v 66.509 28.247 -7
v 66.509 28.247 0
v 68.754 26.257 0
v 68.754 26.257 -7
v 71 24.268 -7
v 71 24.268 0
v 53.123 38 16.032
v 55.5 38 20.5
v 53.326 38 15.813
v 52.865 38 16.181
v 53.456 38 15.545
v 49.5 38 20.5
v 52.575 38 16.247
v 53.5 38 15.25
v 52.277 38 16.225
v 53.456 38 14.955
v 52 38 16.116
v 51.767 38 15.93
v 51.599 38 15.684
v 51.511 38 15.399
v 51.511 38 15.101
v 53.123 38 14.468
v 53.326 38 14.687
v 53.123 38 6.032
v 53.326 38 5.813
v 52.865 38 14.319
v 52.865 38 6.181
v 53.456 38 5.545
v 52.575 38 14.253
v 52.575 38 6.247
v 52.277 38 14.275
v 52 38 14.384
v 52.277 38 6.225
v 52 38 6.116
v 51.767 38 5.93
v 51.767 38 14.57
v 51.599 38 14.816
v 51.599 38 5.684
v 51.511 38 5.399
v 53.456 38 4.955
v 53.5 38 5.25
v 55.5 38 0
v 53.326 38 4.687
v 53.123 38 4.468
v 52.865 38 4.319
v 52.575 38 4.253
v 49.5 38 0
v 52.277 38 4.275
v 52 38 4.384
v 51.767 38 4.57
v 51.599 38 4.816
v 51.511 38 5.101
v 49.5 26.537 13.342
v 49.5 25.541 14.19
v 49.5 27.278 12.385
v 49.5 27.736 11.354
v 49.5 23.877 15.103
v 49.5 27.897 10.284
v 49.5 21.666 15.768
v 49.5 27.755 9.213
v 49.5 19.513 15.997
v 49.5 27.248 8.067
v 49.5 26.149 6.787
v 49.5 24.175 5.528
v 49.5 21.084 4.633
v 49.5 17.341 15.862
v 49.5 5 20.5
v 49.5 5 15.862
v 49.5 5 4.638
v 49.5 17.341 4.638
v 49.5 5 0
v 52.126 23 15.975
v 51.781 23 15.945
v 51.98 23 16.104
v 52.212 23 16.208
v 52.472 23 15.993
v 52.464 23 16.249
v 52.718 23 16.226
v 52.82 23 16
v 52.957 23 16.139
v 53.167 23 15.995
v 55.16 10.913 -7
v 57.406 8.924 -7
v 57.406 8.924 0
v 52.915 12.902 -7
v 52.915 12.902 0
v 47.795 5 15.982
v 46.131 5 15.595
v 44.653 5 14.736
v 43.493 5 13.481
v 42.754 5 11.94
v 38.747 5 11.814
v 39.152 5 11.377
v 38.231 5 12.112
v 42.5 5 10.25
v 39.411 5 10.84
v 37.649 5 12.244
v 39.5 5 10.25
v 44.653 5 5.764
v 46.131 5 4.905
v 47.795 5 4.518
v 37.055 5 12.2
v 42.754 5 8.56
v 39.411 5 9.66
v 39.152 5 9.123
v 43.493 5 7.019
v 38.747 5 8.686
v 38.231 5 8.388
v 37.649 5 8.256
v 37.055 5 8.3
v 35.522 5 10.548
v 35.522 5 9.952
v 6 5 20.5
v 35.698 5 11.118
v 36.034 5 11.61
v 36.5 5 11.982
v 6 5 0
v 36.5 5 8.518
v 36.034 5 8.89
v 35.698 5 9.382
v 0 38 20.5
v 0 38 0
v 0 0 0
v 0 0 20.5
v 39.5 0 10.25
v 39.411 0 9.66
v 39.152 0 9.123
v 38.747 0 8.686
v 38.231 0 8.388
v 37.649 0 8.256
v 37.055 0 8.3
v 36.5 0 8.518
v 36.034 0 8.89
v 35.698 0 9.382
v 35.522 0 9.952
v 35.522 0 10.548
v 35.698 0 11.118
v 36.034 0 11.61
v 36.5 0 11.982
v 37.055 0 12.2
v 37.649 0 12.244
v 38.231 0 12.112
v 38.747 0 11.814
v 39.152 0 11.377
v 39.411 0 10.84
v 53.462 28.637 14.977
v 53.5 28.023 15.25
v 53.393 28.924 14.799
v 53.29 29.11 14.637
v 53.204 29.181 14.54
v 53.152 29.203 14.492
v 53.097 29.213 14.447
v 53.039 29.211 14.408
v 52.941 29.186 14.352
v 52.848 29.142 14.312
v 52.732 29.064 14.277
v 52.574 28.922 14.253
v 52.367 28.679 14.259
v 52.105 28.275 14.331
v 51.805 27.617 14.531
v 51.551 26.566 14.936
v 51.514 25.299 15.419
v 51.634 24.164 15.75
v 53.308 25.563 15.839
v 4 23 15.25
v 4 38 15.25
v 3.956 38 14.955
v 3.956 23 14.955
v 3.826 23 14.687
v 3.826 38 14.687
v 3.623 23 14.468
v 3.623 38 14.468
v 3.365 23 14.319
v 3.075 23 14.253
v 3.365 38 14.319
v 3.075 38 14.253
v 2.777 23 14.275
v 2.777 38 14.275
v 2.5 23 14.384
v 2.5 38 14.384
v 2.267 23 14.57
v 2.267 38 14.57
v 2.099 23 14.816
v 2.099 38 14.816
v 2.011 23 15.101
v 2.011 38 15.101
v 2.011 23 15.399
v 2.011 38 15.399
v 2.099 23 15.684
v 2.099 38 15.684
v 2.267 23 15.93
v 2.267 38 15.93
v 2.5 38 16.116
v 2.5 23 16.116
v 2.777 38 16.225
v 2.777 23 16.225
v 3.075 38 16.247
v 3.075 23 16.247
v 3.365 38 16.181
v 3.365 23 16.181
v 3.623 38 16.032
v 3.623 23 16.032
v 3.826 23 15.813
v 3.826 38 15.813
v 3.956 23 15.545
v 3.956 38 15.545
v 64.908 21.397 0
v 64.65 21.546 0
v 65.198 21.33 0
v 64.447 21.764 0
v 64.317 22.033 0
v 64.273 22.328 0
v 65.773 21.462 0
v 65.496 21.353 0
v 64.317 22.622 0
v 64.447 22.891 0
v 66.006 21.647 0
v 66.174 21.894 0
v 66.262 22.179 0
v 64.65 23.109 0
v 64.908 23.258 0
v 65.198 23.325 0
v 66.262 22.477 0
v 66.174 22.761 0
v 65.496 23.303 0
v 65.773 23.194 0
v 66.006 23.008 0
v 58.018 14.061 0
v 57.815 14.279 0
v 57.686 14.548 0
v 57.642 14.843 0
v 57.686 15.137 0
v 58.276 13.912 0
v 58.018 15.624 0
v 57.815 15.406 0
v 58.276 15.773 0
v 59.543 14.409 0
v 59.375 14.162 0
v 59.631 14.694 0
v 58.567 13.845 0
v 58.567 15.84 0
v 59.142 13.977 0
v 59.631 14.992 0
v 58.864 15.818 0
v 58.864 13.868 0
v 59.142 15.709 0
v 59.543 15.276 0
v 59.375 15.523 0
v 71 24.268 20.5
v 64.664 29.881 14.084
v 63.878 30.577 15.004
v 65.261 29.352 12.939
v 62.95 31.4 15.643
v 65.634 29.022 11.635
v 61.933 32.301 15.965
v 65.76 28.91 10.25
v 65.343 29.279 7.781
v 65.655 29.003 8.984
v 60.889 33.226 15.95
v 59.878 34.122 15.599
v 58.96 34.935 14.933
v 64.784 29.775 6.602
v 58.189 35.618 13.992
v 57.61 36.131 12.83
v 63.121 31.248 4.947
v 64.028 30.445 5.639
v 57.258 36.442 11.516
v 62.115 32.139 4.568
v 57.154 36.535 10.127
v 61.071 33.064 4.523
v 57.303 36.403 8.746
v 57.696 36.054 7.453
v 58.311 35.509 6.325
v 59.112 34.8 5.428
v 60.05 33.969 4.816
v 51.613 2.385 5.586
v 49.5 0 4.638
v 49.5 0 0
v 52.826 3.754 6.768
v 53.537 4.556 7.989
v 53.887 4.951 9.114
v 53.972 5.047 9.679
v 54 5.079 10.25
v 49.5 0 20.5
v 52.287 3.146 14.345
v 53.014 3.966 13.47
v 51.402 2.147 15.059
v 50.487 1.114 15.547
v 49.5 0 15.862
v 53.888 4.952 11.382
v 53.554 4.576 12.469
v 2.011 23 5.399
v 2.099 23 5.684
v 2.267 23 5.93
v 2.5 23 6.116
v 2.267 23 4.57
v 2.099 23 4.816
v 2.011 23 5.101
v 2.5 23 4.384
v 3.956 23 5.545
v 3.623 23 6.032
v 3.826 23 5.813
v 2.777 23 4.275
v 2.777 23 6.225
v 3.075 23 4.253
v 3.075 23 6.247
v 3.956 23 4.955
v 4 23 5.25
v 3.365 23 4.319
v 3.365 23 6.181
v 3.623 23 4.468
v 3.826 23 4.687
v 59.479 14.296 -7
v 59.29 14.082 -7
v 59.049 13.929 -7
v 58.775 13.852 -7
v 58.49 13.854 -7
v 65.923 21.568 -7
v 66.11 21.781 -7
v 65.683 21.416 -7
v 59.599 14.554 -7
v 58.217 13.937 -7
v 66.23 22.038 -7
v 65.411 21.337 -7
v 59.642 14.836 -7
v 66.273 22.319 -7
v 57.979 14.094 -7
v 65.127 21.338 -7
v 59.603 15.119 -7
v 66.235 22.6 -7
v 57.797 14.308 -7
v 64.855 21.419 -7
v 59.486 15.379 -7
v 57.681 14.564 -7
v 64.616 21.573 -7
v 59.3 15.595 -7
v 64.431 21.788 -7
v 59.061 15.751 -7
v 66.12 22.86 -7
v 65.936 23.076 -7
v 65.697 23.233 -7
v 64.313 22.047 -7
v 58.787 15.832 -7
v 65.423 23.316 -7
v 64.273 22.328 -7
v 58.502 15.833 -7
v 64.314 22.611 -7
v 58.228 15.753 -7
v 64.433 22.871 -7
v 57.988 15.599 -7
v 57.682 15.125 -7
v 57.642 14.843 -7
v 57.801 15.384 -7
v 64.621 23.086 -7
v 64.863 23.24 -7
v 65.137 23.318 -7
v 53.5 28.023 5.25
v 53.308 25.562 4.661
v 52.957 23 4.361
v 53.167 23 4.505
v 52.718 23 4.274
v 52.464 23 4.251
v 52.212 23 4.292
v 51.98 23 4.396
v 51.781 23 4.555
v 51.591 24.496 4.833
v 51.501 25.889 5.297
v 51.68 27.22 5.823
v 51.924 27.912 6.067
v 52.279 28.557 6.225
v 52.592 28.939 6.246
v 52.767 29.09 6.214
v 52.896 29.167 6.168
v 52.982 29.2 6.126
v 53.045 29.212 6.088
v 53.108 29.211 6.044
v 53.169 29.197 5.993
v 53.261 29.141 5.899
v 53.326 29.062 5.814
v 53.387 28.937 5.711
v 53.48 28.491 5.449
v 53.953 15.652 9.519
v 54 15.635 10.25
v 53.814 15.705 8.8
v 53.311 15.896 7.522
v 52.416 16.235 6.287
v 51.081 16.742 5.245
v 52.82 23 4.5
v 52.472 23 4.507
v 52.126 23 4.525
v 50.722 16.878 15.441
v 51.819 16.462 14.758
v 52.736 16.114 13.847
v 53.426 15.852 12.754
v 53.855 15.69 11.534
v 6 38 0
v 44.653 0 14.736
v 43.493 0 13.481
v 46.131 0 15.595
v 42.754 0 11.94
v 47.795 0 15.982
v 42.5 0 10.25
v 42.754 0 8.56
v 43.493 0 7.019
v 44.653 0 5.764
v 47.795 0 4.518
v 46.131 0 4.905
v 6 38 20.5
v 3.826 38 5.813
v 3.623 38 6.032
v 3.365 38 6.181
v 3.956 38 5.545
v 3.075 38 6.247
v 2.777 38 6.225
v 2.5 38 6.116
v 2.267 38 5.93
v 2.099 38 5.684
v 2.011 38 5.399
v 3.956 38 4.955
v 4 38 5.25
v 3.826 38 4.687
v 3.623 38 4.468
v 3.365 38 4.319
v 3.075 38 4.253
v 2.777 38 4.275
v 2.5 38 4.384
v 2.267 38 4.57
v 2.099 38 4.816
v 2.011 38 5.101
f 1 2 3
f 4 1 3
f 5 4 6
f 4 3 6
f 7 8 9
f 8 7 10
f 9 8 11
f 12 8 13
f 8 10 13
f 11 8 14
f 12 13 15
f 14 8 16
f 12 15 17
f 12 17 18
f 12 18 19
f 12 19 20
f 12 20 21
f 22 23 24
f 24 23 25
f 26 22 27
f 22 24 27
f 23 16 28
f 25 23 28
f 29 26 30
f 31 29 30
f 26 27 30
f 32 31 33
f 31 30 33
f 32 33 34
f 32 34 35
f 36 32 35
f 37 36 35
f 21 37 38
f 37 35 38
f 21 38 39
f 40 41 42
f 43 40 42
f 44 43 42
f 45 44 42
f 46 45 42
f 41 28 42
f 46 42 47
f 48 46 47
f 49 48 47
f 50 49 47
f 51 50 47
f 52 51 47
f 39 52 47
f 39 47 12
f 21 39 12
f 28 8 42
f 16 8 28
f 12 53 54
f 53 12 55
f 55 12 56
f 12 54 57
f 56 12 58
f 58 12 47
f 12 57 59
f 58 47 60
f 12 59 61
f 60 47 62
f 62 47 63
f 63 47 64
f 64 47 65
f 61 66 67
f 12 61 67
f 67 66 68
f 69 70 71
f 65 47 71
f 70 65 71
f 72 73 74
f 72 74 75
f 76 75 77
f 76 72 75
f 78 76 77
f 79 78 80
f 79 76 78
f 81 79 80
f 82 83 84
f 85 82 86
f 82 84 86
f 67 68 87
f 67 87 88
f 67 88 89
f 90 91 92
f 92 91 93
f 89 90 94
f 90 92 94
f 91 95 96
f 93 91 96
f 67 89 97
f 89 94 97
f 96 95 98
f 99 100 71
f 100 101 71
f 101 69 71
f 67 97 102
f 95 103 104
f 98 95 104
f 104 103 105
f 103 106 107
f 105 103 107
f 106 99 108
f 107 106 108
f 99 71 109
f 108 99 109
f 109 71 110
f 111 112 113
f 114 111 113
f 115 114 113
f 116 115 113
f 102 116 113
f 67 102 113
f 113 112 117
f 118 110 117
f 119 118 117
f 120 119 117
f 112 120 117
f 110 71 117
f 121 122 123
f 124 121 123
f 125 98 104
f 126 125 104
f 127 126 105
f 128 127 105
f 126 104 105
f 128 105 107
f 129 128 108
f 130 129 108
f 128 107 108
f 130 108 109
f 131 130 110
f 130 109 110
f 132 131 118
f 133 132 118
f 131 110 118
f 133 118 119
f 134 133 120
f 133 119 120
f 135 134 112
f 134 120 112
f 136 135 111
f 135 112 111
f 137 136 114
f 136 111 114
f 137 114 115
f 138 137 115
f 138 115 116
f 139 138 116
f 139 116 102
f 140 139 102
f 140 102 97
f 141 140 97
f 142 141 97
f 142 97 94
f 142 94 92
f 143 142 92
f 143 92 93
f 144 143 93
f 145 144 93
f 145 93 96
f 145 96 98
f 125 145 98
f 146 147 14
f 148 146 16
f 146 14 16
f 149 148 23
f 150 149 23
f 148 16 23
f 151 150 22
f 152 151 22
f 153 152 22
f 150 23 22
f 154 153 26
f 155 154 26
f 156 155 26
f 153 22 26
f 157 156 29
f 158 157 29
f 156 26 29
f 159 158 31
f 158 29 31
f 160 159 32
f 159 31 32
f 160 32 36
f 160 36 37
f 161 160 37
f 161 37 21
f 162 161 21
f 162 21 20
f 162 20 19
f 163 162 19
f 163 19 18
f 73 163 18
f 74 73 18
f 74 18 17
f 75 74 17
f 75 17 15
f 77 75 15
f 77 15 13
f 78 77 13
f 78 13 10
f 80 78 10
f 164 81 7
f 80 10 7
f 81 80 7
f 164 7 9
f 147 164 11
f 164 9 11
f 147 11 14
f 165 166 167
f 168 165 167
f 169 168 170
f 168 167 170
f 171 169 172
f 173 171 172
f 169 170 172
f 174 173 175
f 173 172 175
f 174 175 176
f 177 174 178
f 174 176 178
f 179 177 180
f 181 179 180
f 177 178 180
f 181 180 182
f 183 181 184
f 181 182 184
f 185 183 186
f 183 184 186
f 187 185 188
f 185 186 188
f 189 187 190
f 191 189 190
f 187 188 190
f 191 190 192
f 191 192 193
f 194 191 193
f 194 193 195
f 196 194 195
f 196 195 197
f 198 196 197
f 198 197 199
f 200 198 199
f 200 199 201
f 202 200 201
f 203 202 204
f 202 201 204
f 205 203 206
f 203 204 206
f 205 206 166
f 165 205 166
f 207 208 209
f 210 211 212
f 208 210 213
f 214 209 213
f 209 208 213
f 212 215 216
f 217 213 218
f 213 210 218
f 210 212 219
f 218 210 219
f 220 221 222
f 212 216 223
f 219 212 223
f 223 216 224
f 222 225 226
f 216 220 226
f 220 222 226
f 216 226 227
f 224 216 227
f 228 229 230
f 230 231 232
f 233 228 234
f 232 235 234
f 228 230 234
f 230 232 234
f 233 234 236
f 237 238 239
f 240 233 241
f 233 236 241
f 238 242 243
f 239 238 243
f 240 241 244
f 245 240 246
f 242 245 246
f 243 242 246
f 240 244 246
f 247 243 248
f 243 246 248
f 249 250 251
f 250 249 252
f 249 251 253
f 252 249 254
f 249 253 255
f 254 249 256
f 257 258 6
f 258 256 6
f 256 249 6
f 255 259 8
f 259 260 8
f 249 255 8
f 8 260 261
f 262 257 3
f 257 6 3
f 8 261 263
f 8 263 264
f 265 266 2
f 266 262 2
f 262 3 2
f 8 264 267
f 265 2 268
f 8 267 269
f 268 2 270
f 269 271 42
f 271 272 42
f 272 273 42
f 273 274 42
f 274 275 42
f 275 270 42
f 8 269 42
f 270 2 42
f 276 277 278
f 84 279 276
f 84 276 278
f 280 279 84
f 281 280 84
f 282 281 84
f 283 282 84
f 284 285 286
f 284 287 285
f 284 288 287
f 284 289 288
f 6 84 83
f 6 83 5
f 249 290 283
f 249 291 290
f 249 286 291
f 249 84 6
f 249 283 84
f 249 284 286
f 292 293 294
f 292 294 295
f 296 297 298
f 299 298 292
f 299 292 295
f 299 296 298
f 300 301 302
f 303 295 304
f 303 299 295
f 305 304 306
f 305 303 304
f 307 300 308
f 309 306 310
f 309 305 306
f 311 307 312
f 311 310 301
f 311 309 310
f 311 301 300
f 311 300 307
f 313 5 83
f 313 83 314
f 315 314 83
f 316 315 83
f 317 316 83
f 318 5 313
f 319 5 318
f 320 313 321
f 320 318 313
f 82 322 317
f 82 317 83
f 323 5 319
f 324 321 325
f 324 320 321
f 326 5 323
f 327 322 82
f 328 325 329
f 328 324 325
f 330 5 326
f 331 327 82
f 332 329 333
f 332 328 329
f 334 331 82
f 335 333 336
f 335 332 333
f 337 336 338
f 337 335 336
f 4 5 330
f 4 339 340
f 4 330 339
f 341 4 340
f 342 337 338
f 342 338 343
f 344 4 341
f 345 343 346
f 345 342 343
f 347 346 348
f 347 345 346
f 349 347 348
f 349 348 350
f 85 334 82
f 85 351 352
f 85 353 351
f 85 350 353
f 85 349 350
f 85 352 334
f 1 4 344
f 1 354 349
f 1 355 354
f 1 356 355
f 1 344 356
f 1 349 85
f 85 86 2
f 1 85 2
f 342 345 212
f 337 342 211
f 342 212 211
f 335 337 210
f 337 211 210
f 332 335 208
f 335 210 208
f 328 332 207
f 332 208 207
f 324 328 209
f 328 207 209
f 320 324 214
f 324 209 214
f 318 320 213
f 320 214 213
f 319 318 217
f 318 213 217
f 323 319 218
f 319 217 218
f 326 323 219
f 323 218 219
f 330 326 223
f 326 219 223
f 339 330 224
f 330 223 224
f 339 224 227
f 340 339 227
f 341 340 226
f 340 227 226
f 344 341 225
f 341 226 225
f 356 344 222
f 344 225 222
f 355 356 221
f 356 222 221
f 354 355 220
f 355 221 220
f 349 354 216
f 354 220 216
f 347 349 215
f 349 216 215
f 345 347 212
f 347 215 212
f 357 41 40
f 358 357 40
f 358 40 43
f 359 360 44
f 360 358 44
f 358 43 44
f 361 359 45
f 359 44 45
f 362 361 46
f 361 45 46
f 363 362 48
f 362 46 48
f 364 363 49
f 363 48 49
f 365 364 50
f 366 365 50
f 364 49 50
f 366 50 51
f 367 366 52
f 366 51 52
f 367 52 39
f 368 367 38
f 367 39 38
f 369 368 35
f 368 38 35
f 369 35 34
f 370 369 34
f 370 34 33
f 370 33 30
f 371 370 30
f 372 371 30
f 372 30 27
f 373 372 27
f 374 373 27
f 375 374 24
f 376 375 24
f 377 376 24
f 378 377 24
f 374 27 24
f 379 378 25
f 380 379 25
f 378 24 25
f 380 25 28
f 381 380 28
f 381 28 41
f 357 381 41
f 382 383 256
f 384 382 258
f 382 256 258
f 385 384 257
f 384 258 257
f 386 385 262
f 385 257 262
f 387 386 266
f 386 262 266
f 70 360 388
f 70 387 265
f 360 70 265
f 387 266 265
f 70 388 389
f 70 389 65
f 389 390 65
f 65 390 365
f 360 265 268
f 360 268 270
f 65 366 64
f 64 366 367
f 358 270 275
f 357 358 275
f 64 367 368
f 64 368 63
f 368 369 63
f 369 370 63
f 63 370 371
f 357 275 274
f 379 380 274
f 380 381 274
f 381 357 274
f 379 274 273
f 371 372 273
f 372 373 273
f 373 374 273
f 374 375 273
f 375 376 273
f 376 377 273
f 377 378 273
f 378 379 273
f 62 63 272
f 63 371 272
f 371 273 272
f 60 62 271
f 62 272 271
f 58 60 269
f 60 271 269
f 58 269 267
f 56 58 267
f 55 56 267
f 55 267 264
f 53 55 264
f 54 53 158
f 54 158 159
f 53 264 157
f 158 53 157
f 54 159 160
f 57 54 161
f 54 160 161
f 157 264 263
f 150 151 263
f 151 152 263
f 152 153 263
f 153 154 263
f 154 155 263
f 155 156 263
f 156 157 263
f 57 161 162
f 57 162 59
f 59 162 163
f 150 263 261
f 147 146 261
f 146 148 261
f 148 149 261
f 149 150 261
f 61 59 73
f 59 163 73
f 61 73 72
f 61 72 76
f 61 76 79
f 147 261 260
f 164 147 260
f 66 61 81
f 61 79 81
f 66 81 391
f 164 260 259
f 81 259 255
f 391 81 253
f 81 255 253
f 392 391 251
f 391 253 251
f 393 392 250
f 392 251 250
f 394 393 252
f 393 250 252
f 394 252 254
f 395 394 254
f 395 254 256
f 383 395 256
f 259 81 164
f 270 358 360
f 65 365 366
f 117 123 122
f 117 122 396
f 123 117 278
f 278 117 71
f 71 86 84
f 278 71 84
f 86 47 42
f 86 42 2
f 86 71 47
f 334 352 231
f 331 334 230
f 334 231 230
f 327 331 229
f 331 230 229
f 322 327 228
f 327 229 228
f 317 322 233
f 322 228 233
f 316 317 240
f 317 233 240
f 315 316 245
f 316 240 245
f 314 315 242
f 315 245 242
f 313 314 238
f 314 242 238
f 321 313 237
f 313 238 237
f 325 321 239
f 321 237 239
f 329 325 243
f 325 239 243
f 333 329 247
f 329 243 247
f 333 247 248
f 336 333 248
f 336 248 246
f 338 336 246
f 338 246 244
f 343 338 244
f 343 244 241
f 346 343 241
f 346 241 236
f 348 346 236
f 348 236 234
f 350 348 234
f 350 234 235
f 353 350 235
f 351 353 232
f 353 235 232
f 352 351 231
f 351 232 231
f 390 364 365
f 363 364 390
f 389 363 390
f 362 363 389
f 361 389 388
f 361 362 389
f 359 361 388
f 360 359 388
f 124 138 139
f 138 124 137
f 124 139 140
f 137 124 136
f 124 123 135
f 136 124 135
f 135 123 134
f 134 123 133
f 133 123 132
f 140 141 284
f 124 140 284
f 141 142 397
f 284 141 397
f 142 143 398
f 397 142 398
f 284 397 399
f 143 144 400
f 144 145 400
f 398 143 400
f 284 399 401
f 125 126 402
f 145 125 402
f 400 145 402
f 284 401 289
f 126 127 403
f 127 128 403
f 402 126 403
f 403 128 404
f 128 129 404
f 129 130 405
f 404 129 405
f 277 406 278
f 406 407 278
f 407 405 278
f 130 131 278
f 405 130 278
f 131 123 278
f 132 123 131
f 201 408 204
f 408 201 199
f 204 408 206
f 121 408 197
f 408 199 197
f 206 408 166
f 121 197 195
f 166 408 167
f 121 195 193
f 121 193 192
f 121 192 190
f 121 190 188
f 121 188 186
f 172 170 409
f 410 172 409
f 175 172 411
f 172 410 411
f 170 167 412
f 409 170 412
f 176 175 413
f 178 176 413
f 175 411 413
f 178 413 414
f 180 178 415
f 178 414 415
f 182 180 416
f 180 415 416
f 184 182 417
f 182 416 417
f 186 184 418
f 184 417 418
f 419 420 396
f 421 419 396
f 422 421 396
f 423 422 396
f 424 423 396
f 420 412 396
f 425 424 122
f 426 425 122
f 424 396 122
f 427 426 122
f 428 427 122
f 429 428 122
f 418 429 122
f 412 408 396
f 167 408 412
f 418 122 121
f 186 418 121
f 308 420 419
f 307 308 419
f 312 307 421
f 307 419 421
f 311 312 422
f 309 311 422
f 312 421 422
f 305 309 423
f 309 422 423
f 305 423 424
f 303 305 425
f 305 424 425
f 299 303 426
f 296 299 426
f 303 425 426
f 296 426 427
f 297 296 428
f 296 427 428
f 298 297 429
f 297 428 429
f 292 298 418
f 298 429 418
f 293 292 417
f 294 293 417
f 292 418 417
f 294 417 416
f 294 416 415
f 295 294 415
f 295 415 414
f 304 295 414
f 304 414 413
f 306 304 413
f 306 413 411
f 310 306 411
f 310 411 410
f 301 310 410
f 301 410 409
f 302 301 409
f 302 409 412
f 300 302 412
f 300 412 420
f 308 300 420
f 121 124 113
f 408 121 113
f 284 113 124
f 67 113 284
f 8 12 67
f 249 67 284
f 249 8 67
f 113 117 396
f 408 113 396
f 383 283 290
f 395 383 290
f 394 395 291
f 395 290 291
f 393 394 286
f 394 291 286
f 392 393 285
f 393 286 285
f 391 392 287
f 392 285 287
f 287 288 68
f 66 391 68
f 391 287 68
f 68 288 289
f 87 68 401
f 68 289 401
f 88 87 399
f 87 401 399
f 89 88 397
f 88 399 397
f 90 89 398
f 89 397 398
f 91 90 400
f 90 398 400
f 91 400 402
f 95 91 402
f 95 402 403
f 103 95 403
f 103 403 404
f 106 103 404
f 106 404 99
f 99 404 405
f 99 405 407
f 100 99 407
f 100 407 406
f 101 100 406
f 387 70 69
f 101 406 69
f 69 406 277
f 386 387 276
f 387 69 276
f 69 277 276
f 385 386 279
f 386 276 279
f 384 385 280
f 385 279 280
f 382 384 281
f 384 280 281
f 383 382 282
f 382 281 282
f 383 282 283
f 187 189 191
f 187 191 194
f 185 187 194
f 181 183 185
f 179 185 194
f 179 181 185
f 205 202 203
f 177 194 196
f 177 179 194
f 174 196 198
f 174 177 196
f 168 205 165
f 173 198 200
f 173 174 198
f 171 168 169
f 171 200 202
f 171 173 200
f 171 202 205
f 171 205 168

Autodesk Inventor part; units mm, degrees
ref_plane "YZ Plane" through (0, 0, 0) normal (1, 0, 0) x (0, 1, 0)
ref_plane "XZ Plane" through (0, 0, 0) normal (0, 1, 0) x (-1, 0, 0)
ref_plane "XY Plane" through (0, 0, 0) normal (0, 0, 1) x (1, 0, 0)
sketch "Эскиз1" plane through (0, 0, 0) normal (0, 0, 1) x (1, 0, 0)
  line L0 (0, 0) -> (6, 0)
  line L1 (6, 0) -> (6, 38)
  line L2 (6, 38) -> (0, 38)
  line L3 (0, 38) -> (0, 0)
  line L4 (0, 0) -> (49.5, 0)
  line L5 (49.5, 0) -> (49.5, 5)
  line L6 (49.5, 5) -> (0, 5)
  line L7 (0, 5) -> (0, 0)
  line L8 (49.5, 0) -> (55.5, 0) construction
  line L9 (55.5, 0) -> (55.5, 38) construction
  line L10 (55.5, 38) -> (49.5, 38)
  line L11 (49.5, 38) -> (49.5, 0)
  line L12 (49.5, 0) -> (71, 24.2678)
  line L13 (71, 24.2678) -> (55.5, 38)
  dimension "d0" = 5
  dimension "d1" = 6
  dimension "d2" = 43.5
  dimension "d3" = 6
  dimension "d4" = 38
  dimension "d5" = 38
  dimension "d6" = 71
  dimension "d7" = 90
extrude "Выдавливание1" add sketch "Эскиз1" along normal blind 20.5
sketch "Эскиз2" plane through (0, 0, 0) normal (0, 0, -1) x (-1, 0, 0)
  line L0 (-49.5, 0) -> (-71, 24.2678) projected
  line L1 (-71, 24.2678) -> (-57.4058, 8.9235)
  line L2 (-57.4058, 8.9235) -> (-52.9148, 12.9023)
  line L3 (-52.9148, 12.9023) -> (-66.509, 28.2466)
  line L4 (-66.509, 28.2466) -> (-71, 24.2678)
  line L5 (-71, 24.2678) -> (-55.5, 38) projected
  line L6 (-58.6417, 14.8426) -> (-55.1603, 10.9129)
  line L7 (-65.273, 22.3276) -> (-68.7545, 26.2572)
  circle A0 centre (-65.273, 22.3276) radius 1
  circle A1 centre (-58.6417, 14.8426) radius 1
  point P0 (0, 0)
  dimension "d10" = 6
  dimension "d11" = 20.5
  dimension "d13" = 2
  dimension "d14" = 2
  dimension "d15" = 8
extrude "Выдавливание2" add sketch "Эскиз2" along normal blind 7
sketch "Эскиз3" plane through (49.5, 38, 0) normal (0, 1, 0) x (1, 0, 0)
  circle A0 centre (3, -5.25) radius 1
  circle A1 centre (3, -15.25) radius 1
  circle A2 centre (-46.5, -5.25) radius 1
  circle A3 centre (-46.5, -15.25) radius 1
  line L0 (6, -20.5) -> (0, -20.5) projected
  line L1 (3, -5.25) -> (3, -15.25) construction
  line L2 (6, 0) -> (6, -20.5) projected
  line L3 (-43.5, 0) -> (-49.5, 0) projected
  line L4 (0, 0) -> (0, -20.5) projected
  circle A4 centre (-12, -10.25) radius 2
  point P0 (3, -20.5)
  point P1 (3, -10.25)
  point P2 (6, -10.25)
  point P3 (-46.5, 0)
  point P4 (6, -10.25)
  dimension "d18" = 2
  dimension "d19" = 10
  dimension "d20" = 4
  dimension "d21" = 18
extrude "Выдавливание3" cut sketch "Эскиз3" against normal up to next contours A4
extrude "Выдавливание4" cut sketch "Эскиз3" against normal blind 15 contours A0 | A1 | A2 | A3
sketch "Эскиз4" plane through (55.5, 38, 20.5) normal (0.6631, 0.7485, 0) x (0.7485, -0.6631, 0)
  circle A0 centre (7.958, 10.25) radius 5.75
  line L0 (0, 20.5) -> (0, 0) projected
  line L1 (20.708, 27.5) -> (20.708, 0) projected
  point P0 (-16.3428, 20.5)
  point P1 (0, 10.25)
  dimension "d26" = 7
  dimension "d27" = 11.5
extrude "Выдавливание5" cut sketch "Эскиз4" against normal up to next
sketch "Эскиз5" plane through (0, 0, 0) normal (0, -1, 0) x (1, 0, 0)
  circle A0 centre (48.25, 10.25) radius 5.75
  line L0 (49.5, 0) -> (49.5, 20.5) projected
  circle A1 centre (37.5, 10.25) radius 2 projected
  point P0 (0, 0)
  point P1 (49.5, 10.25)
  dimension "d30" = 11.5
  dimension "d31" = 3
extrude "Выдавливание6" cut sketch "Эскиз5" against normal up to next contours A0 L0 | L0 A0
properties part number "kreplenie3"
